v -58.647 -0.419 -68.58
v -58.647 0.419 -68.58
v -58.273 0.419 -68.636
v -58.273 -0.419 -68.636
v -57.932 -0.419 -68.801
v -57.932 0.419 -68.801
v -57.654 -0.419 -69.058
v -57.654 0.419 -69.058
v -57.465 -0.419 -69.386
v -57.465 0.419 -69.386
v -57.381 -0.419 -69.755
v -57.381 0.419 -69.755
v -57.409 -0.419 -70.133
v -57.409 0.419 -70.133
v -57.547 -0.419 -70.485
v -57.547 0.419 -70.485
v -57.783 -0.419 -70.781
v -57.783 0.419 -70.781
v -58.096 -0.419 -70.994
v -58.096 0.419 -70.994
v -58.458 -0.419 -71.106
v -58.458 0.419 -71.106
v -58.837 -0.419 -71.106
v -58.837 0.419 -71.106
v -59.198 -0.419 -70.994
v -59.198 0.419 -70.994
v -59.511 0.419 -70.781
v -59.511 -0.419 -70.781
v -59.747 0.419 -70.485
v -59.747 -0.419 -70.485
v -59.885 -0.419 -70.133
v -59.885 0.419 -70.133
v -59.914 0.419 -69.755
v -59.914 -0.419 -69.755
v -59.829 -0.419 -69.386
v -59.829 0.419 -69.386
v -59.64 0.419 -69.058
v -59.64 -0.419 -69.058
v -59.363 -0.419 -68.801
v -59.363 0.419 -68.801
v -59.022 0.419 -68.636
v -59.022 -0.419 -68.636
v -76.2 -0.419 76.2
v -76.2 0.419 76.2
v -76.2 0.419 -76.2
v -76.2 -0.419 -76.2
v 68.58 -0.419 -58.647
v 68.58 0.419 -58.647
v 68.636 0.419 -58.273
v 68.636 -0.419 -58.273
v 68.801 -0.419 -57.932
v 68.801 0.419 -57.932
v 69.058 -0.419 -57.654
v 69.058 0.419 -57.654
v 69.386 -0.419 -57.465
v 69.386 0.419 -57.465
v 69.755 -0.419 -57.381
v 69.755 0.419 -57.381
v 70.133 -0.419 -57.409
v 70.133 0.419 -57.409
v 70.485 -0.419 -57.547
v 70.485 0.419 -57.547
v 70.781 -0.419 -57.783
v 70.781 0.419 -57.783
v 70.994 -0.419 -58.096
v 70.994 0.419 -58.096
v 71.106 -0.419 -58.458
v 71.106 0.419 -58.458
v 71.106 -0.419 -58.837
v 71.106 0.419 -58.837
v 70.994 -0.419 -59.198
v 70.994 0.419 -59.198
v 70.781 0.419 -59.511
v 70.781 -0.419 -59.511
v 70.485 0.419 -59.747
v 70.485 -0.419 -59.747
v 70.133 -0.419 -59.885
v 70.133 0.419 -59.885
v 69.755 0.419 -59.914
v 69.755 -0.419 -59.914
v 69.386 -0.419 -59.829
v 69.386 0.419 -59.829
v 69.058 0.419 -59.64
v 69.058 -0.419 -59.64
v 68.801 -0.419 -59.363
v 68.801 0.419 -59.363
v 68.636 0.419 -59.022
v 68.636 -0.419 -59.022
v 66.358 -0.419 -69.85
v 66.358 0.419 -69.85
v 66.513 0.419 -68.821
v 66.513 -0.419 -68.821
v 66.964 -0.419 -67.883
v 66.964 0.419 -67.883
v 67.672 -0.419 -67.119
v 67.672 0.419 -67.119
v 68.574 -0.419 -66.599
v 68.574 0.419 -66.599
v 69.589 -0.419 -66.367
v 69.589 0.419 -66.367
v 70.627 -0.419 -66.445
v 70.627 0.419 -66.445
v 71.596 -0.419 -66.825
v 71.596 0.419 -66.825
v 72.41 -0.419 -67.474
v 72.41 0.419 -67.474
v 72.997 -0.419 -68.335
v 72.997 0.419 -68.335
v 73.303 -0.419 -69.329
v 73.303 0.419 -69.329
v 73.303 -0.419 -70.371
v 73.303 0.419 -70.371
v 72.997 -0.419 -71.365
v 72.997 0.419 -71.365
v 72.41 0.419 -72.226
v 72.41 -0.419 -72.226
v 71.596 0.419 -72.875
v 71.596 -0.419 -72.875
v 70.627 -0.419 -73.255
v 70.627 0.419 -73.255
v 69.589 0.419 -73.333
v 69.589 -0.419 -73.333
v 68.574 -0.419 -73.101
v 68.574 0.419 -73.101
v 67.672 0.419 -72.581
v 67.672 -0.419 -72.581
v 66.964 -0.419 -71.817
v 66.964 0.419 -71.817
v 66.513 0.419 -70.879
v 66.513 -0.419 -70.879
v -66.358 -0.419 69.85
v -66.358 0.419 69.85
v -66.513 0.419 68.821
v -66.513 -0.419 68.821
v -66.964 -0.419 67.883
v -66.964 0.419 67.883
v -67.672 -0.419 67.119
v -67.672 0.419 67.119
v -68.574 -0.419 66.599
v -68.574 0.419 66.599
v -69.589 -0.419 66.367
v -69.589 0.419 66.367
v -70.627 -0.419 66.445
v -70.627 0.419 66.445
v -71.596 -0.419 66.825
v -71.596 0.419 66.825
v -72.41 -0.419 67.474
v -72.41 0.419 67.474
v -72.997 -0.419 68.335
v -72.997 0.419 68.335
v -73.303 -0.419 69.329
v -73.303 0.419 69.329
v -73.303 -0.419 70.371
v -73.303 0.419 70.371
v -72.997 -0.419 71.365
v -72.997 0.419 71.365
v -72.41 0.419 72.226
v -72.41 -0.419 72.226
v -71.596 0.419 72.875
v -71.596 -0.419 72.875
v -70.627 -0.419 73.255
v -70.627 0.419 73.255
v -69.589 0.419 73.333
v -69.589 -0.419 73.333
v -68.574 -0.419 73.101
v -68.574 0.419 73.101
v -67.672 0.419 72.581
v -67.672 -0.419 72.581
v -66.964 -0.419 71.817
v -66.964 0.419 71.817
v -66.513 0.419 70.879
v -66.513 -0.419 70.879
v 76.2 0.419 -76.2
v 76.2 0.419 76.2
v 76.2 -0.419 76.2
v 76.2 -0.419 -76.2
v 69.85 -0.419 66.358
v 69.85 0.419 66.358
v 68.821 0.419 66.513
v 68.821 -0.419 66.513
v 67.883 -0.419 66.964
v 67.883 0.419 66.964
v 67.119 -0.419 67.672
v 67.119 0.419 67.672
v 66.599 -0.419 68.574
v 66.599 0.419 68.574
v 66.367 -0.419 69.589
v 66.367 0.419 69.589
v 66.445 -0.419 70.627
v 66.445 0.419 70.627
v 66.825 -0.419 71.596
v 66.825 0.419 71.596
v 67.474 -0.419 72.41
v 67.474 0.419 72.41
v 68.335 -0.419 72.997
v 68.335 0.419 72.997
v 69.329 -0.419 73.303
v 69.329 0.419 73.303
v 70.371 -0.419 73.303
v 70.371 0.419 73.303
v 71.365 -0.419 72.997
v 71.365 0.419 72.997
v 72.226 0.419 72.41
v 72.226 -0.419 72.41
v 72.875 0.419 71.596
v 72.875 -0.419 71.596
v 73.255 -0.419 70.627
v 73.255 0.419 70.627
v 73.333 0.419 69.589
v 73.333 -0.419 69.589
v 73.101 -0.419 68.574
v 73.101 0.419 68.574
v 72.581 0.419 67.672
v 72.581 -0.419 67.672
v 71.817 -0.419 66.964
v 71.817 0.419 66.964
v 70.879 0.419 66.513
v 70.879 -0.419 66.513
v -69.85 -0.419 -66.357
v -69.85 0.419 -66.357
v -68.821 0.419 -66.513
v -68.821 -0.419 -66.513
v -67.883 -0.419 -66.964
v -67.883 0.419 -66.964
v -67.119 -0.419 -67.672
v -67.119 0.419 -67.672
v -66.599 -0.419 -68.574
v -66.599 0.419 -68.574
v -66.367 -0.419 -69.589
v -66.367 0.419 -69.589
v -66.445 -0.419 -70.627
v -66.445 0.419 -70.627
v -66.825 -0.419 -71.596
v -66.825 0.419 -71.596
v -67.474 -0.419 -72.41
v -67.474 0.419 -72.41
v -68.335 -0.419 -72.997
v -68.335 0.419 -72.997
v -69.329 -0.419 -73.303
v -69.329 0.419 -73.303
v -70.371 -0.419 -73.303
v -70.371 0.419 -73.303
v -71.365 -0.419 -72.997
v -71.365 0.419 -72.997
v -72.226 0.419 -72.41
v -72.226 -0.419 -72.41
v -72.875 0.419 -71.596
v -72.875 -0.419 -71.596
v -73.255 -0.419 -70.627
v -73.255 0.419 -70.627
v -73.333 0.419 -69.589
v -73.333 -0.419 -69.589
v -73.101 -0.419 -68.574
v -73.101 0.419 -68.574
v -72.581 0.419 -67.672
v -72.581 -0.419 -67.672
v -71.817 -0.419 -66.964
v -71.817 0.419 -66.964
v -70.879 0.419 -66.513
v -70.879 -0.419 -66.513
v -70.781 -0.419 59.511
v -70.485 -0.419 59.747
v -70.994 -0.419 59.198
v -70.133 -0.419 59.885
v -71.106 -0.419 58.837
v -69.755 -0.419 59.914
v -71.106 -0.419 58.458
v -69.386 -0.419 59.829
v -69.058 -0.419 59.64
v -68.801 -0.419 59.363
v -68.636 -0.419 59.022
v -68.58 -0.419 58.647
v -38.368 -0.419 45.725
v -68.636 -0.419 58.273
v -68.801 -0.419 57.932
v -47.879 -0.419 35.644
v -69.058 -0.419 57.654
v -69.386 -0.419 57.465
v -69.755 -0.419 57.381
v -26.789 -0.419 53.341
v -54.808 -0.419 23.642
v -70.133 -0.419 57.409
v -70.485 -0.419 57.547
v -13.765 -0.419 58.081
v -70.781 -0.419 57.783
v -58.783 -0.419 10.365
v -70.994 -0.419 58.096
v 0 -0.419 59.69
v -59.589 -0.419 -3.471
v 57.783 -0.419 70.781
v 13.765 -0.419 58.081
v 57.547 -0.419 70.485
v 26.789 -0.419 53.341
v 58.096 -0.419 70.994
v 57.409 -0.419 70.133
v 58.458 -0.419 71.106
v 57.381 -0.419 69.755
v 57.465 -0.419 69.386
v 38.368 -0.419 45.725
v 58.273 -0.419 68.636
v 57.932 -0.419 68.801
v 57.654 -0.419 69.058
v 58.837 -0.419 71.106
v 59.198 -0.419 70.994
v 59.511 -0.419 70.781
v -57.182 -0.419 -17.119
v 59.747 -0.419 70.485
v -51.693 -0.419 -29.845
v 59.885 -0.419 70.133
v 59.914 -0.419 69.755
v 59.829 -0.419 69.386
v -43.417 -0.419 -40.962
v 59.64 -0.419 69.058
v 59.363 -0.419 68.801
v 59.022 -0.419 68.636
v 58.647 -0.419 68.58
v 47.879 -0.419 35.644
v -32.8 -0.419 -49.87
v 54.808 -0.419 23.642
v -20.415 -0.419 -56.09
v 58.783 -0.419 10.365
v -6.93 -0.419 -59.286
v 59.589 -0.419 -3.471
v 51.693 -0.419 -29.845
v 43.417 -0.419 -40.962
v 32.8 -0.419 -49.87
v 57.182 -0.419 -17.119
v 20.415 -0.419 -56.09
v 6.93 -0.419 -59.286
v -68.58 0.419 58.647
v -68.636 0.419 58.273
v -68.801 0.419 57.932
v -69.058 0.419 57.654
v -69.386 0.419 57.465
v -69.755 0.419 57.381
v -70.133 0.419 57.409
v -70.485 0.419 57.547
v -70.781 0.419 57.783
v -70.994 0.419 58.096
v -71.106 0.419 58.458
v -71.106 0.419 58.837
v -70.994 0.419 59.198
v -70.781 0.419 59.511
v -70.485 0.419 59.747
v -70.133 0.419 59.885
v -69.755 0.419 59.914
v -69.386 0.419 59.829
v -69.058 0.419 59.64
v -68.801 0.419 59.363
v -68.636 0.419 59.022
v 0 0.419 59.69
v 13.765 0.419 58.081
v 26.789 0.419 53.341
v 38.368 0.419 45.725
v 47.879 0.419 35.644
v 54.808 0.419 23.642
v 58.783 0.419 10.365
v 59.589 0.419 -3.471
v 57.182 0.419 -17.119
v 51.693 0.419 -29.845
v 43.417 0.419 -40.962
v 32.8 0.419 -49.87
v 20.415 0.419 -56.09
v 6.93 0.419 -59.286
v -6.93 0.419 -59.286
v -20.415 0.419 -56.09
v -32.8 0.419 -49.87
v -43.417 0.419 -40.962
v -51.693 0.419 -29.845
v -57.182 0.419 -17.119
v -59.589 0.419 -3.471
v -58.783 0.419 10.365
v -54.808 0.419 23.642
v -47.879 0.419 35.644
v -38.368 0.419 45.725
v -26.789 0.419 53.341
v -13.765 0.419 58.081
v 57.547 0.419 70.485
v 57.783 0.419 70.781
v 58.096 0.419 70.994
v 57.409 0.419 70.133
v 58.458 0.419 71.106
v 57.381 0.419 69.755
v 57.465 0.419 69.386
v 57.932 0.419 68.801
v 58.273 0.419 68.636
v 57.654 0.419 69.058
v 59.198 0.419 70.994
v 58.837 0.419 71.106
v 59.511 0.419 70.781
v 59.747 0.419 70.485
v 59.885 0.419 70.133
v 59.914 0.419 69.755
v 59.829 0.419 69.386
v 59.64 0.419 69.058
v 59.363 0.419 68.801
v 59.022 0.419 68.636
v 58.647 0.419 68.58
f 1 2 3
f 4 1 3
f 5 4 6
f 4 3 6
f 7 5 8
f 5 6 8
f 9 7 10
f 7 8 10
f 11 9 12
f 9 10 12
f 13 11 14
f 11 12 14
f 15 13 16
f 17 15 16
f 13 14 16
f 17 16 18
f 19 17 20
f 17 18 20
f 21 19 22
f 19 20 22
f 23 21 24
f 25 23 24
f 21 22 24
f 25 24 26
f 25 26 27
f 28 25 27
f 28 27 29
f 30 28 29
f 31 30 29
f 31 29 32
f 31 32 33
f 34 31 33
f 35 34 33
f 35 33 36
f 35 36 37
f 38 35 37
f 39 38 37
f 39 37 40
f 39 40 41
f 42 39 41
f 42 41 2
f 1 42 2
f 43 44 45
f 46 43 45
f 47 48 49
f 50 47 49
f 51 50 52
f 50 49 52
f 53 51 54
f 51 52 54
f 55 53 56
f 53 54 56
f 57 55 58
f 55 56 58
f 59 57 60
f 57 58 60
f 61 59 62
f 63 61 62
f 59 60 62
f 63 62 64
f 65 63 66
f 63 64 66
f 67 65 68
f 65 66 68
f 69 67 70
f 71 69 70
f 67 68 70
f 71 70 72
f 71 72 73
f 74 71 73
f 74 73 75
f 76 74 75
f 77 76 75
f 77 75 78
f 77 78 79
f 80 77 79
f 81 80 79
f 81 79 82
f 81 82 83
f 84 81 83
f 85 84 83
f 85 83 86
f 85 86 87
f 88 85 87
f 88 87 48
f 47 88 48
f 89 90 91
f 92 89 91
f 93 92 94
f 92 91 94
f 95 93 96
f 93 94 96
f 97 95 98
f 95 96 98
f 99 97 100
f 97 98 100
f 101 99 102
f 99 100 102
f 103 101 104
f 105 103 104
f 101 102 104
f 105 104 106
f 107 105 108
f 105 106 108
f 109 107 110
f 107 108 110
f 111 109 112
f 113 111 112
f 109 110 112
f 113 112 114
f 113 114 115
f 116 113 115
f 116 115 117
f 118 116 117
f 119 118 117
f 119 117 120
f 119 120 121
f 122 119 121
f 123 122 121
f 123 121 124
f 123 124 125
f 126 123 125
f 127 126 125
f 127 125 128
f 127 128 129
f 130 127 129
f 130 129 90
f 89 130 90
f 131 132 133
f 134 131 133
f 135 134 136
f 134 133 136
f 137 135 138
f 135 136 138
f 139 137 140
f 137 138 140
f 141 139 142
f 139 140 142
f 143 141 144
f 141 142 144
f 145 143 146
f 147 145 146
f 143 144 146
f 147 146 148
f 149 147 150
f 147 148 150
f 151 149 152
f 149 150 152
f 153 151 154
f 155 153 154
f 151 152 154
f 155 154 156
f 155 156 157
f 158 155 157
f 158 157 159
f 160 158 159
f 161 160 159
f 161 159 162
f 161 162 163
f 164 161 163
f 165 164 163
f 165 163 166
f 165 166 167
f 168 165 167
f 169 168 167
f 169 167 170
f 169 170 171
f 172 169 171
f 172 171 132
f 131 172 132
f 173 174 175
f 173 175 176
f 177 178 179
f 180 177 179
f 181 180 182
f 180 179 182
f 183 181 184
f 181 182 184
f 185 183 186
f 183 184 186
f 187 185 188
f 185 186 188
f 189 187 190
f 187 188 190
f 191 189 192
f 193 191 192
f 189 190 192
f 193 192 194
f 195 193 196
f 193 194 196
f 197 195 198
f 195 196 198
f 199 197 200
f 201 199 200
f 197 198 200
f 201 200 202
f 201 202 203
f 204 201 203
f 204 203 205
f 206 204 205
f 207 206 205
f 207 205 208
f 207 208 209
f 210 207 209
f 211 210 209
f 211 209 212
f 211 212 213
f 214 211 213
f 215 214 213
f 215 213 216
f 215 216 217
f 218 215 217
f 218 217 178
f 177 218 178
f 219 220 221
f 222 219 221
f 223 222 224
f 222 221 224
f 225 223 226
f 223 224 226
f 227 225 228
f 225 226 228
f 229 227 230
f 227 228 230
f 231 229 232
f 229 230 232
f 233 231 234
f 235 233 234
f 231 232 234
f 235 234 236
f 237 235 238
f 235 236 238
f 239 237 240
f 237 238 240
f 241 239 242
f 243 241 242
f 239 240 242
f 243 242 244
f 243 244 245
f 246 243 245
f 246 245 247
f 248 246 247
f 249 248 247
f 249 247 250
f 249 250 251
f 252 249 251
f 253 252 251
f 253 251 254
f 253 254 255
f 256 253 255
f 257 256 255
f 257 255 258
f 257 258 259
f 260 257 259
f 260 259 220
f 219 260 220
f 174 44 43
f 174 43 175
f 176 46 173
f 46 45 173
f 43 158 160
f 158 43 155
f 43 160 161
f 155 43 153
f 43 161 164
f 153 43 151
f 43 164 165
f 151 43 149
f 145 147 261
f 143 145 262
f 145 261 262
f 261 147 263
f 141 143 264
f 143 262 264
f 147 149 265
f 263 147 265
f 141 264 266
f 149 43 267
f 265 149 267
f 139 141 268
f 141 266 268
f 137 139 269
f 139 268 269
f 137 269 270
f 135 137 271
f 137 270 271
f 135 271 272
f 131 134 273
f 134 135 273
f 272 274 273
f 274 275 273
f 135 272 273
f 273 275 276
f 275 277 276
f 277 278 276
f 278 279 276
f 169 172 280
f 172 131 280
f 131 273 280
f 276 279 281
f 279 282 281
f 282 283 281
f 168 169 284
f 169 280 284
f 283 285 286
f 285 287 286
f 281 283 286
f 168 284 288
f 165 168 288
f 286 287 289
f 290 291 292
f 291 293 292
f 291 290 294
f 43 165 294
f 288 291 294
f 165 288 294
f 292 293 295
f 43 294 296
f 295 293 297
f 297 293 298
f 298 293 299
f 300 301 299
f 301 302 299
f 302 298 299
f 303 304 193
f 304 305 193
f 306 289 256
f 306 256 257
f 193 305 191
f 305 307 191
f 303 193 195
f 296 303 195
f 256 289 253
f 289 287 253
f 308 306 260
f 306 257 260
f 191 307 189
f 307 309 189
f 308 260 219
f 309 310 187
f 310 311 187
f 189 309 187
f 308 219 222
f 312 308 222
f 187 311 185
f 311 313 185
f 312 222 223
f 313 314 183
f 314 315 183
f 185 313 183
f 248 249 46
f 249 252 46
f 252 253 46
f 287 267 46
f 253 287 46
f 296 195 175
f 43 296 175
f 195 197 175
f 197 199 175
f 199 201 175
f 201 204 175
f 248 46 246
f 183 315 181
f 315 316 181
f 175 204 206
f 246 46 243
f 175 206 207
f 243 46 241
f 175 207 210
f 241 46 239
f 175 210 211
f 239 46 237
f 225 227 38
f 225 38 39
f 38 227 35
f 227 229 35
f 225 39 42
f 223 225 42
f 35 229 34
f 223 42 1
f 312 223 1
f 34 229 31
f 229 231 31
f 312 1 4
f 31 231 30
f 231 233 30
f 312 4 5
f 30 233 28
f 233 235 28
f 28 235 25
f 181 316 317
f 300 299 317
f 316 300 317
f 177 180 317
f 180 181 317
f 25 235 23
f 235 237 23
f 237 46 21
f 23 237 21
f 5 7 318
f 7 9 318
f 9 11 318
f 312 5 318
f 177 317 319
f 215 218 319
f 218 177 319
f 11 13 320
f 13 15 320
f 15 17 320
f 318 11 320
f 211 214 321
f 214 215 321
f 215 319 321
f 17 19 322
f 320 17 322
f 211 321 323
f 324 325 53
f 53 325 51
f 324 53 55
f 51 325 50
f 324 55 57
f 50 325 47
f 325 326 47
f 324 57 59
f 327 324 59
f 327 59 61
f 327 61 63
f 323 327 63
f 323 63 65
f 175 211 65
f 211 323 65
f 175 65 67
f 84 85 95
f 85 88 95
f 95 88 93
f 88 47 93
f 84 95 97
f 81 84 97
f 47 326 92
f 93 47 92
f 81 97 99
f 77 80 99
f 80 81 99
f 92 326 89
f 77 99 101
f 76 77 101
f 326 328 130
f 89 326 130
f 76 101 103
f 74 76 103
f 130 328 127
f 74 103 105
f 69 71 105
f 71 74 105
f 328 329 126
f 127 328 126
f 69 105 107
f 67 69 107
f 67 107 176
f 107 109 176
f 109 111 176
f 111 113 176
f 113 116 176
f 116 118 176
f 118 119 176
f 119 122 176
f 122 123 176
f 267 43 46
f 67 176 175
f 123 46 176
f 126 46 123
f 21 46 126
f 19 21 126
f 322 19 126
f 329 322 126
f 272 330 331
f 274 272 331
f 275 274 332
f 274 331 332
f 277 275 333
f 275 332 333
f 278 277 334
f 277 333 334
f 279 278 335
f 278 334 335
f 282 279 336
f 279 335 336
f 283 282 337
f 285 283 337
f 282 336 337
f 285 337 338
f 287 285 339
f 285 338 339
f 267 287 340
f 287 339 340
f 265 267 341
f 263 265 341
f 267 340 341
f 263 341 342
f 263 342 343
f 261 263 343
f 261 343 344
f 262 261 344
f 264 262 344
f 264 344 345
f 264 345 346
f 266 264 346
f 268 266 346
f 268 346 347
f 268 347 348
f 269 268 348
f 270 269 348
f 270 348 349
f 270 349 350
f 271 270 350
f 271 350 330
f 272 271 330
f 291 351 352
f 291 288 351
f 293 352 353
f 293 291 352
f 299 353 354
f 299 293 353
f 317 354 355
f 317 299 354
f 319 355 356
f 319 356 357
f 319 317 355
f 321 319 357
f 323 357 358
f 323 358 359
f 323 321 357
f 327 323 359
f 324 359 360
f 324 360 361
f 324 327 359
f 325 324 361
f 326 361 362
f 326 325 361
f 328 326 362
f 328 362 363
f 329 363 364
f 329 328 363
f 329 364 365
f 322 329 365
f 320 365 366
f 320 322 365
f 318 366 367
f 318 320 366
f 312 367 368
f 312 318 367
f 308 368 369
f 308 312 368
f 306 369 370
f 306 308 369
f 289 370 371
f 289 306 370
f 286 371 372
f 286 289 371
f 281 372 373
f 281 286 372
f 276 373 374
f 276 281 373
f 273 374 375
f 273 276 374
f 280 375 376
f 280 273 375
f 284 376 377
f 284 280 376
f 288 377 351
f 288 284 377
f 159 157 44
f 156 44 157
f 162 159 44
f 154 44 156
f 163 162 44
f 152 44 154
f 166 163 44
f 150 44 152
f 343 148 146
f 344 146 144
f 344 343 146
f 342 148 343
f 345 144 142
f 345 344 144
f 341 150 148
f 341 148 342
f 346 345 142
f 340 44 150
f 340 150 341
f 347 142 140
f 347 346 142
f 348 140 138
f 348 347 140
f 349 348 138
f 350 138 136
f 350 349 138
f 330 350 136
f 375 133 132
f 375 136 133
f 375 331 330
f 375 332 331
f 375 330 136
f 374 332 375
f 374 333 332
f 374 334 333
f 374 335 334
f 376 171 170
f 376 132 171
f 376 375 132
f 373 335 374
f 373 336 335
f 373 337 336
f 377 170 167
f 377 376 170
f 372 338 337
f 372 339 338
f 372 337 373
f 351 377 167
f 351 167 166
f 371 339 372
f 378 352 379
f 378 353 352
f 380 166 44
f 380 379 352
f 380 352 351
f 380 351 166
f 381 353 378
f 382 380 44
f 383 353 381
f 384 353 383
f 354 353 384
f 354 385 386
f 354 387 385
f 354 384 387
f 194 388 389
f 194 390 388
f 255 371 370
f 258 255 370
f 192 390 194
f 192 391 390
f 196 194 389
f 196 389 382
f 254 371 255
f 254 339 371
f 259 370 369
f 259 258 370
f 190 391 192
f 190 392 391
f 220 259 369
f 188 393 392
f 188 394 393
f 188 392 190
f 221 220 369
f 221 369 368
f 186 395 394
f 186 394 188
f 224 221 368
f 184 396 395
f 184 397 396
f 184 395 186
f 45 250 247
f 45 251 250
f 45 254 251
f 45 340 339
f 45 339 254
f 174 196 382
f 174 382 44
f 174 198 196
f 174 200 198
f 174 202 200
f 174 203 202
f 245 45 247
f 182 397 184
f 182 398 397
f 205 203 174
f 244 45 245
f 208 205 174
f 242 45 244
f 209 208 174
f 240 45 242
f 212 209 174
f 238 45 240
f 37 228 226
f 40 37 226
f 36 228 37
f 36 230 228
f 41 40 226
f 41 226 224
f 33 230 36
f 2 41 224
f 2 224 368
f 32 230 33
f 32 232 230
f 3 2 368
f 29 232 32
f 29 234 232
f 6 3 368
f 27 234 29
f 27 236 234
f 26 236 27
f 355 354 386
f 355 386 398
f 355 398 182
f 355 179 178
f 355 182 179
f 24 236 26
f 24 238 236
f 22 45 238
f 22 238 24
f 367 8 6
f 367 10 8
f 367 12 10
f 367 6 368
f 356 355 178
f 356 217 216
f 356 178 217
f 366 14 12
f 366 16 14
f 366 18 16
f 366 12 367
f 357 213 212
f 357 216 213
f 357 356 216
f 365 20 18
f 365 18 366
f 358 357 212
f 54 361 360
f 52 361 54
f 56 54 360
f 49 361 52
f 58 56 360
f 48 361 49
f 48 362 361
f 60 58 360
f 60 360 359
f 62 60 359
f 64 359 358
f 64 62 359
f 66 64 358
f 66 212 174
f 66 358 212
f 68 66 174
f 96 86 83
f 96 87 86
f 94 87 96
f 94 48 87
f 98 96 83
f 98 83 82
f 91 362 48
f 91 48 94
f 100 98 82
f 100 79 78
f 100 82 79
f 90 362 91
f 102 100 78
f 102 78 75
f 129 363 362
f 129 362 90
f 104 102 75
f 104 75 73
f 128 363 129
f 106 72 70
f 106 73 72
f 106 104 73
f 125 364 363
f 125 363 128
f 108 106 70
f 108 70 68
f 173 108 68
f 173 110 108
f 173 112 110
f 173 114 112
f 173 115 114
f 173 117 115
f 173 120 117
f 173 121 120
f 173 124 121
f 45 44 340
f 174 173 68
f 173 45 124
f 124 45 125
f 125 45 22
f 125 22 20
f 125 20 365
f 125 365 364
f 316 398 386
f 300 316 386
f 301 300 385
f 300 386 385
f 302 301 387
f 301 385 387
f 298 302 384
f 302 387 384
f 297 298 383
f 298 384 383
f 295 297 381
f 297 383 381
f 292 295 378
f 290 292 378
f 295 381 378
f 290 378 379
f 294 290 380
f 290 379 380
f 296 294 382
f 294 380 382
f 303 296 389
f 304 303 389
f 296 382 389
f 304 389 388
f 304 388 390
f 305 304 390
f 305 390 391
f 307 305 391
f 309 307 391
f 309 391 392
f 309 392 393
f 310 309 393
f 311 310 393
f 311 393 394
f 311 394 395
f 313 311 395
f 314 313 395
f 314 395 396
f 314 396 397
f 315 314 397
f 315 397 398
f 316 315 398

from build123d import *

# Parameters (mm, degrees)
SKETCH1_W           = 152.4
SKETCH1_H           = 152.4
SKETCH1_R           = 59.69
BOSS_EXTRUDE1_DEPTH = 0.4191
SKETCH2_R           = 3.4925
SKETCH2_R_2         = 1.27
CUT_EXTRUDE1_DEPTH  = 108.766333236
CIRPATTERN1_COUNT   = 4


with BuildPart() as part:
    # Sketch1 → Boss-Extrude1 (new, symmetric)
    with BuildSketch(Plane(origin=(0, 0, 0), x_dir=(1, 0, 0), z_dir=(0, 1, 0))):
        Rectangle(SKETCH1_W, SKETCH1_H)
        with Locations(Location((0, 0, 0), (0, 0, 270))):
            Circle(SKETCH1_R, mode=Mode.SUBTRACT)
    extrude(amount=BOSS_EXTRUDE1_DEPTH, both=True)

    # Sketch2 → Cut-Extrude1 (cut, through all)
    with BuildSketch(Plane(origin=(0, 0.4191, 0), x_dir=(1, 0, 0), z_dir=(0, 1, 0))):
        with Locations(Location((-69.85, 69.85, 0), (0, 0, 270))):
            Circle(SKETCH2_R)
        with Locations(Location((-58.647249233, 69.85, 0), (0, 0, 270))):
            Circle(SKETCH2_R_2)
    cut_extrude1 = extrude(amount=-CUT_EXTRUDE1_DEPTH, mode=Mode.SUBTRACT)

    # CirPattern1: Cut-Extrude1 ×4 about axis
    cirpattern1_axis = Axis((0, 0, 0), (0, 1, 0))
    for i in range(1, CIRPATTERN1_COUNT):
        add(cut_extrude1.rotate(cirpattern1_axis, i * 360 / CIRPATTERN1_COUNT), mode=Mode.SUBTRACT)


solid = part.part
